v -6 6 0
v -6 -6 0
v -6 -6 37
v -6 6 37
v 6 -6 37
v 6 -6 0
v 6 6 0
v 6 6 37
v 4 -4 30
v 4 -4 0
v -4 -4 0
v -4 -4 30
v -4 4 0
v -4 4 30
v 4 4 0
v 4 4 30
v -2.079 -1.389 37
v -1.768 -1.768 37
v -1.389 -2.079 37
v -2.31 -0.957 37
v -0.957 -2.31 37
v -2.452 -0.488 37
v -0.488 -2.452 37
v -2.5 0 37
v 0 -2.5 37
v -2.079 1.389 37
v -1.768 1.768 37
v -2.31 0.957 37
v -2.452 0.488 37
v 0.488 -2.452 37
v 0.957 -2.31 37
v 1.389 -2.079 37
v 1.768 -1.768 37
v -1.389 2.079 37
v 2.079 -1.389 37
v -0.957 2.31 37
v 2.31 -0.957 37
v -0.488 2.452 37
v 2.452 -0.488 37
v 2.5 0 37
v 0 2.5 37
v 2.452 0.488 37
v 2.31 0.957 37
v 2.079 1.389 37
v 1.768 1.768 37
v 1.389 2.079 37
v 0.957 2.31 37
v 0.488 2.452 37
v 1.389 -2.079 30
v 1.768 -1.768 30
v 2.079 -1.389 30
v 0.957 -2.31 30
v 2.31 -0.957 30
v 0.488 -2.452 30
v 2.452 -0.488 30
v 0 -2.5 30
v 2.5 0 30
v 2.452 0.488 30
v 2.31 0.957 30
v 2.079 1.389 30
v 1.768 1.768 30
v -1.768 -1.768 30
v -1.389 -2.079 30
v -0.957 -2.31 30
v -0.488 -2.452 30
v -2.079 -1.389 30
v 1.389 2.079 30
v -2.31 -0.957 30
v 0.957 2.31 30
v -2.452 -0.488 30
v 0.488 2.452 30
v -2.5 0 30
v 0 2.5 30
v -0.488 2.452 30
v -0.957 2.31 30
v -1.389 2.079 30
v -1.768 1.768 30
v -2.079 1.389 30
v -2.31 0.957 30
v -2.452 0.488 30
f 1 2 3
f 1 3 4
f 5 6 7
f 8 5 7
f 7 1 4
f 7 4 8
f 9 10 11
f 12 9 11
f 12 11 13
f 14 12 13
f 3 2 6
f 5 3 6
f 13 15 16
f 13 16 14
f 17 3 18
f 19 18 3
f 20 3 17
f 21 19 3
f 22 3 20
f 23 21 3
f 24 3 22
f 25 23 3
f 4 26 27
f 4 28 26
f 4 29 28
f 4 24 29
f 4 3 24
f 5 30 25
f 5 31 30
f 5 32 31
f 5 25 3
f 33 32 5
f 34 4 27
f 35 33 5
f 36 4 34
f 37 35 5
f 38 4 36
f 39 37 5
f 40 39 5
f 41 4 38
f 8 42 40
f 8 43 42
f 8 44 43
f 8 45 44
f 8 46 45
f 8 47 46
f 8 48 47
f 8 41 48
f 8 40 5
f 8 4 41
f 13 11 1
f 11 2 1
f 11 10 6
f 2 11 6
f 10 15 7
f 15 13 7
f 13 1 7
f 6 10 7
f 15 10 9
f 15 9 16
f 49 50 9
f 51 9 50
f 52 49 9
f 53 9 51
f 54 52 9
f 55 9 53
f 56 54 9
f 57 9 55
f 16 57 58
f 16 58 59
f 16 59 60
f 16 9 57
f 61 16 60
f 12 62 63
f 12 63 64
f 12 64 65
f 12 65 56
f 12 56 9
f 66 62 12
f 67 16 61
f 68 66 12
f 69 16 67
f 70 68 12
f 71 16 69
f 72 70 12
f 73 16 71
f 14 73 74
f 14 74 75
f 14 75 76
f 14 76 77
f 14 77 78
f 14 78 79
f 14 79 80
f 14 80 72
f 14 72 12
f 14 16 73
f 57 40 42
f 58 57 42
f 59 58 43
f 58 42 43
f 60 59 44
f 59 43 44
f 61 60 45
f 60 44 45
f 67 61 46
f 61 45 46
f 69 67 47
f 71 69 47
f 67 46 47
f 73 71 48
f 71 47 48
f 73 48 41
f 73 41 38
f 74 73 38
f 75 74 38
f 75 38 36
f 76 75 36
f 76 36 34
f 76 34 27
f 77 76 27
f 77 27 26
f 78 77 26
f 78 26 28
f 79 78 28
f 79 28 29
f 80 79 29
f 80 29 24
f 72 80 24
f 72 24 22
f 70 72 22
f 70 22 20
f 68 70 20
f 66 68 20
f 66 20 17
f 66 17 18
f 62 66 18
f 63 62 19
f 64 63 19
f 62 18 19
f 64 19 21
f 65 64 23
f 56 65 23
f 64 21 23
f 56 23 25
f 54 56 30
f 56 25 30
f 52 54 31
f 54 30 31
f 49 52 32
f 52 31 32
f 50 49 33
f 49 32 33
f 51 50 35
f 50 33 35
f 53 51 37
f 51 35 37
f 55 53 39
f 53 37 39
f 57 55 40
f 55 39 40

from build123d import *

# Parameters (mm, degrees)
SKETCH1_W           = 12
SKETCH1_H           = 12
BOSS_EXTRUDE1_DEPTH = 37
SKETCH2_W           = 8
SKETCH2_H           = 8
CUT_EXTRUDE1_DEPTH  = 30
CUT_EXTRUDE2_REACH  = 39.961
SKETCH3_R           = 2.5


with BuildPart() as part:
    # Sketch1 → Boss-Extrude1 (new body)
    with BuildSketch(Plane.XY):
        Rectangle(SKETCH1_W, SKETCH1_H)
    extrude(amount=BOSS_EXTRUDE1_DEPTH)

    # Sketch2 → Cut-Extrude1 (cut)
    with BuildSketch(Plane(origin=(0, 0, 0), x_dir=(-1, 0, 0), z_dir=(0, 0, -1))):
        Rectangle(SKETCH2_W, SKETCH2_H)
    extrude(amount=-CUT_EXTRUDE1_DEPTH, mode=Mode.SUBTRACT)

    # Sketch3 → Cut-Extrude2 (cut, up to next)
    with BuildSketch(Plane.XY.offset(37), mode=Mode.PRIVATE) as cut_extrude2_sk1:
        Circle(SKETCH3_R)
    cut_extrude2_tool1 = extrude(cut_extrude2_sk1.sketch, amount=-CUT_EXTRUDE2_REACH, mode=Mode.PRIVATE) & part.part
    add(cut_extrude2_tool1.solids().sort_by_distance((0, 0, 37))[0], mode=Mode.SUBTRACT)


solid = part.part
